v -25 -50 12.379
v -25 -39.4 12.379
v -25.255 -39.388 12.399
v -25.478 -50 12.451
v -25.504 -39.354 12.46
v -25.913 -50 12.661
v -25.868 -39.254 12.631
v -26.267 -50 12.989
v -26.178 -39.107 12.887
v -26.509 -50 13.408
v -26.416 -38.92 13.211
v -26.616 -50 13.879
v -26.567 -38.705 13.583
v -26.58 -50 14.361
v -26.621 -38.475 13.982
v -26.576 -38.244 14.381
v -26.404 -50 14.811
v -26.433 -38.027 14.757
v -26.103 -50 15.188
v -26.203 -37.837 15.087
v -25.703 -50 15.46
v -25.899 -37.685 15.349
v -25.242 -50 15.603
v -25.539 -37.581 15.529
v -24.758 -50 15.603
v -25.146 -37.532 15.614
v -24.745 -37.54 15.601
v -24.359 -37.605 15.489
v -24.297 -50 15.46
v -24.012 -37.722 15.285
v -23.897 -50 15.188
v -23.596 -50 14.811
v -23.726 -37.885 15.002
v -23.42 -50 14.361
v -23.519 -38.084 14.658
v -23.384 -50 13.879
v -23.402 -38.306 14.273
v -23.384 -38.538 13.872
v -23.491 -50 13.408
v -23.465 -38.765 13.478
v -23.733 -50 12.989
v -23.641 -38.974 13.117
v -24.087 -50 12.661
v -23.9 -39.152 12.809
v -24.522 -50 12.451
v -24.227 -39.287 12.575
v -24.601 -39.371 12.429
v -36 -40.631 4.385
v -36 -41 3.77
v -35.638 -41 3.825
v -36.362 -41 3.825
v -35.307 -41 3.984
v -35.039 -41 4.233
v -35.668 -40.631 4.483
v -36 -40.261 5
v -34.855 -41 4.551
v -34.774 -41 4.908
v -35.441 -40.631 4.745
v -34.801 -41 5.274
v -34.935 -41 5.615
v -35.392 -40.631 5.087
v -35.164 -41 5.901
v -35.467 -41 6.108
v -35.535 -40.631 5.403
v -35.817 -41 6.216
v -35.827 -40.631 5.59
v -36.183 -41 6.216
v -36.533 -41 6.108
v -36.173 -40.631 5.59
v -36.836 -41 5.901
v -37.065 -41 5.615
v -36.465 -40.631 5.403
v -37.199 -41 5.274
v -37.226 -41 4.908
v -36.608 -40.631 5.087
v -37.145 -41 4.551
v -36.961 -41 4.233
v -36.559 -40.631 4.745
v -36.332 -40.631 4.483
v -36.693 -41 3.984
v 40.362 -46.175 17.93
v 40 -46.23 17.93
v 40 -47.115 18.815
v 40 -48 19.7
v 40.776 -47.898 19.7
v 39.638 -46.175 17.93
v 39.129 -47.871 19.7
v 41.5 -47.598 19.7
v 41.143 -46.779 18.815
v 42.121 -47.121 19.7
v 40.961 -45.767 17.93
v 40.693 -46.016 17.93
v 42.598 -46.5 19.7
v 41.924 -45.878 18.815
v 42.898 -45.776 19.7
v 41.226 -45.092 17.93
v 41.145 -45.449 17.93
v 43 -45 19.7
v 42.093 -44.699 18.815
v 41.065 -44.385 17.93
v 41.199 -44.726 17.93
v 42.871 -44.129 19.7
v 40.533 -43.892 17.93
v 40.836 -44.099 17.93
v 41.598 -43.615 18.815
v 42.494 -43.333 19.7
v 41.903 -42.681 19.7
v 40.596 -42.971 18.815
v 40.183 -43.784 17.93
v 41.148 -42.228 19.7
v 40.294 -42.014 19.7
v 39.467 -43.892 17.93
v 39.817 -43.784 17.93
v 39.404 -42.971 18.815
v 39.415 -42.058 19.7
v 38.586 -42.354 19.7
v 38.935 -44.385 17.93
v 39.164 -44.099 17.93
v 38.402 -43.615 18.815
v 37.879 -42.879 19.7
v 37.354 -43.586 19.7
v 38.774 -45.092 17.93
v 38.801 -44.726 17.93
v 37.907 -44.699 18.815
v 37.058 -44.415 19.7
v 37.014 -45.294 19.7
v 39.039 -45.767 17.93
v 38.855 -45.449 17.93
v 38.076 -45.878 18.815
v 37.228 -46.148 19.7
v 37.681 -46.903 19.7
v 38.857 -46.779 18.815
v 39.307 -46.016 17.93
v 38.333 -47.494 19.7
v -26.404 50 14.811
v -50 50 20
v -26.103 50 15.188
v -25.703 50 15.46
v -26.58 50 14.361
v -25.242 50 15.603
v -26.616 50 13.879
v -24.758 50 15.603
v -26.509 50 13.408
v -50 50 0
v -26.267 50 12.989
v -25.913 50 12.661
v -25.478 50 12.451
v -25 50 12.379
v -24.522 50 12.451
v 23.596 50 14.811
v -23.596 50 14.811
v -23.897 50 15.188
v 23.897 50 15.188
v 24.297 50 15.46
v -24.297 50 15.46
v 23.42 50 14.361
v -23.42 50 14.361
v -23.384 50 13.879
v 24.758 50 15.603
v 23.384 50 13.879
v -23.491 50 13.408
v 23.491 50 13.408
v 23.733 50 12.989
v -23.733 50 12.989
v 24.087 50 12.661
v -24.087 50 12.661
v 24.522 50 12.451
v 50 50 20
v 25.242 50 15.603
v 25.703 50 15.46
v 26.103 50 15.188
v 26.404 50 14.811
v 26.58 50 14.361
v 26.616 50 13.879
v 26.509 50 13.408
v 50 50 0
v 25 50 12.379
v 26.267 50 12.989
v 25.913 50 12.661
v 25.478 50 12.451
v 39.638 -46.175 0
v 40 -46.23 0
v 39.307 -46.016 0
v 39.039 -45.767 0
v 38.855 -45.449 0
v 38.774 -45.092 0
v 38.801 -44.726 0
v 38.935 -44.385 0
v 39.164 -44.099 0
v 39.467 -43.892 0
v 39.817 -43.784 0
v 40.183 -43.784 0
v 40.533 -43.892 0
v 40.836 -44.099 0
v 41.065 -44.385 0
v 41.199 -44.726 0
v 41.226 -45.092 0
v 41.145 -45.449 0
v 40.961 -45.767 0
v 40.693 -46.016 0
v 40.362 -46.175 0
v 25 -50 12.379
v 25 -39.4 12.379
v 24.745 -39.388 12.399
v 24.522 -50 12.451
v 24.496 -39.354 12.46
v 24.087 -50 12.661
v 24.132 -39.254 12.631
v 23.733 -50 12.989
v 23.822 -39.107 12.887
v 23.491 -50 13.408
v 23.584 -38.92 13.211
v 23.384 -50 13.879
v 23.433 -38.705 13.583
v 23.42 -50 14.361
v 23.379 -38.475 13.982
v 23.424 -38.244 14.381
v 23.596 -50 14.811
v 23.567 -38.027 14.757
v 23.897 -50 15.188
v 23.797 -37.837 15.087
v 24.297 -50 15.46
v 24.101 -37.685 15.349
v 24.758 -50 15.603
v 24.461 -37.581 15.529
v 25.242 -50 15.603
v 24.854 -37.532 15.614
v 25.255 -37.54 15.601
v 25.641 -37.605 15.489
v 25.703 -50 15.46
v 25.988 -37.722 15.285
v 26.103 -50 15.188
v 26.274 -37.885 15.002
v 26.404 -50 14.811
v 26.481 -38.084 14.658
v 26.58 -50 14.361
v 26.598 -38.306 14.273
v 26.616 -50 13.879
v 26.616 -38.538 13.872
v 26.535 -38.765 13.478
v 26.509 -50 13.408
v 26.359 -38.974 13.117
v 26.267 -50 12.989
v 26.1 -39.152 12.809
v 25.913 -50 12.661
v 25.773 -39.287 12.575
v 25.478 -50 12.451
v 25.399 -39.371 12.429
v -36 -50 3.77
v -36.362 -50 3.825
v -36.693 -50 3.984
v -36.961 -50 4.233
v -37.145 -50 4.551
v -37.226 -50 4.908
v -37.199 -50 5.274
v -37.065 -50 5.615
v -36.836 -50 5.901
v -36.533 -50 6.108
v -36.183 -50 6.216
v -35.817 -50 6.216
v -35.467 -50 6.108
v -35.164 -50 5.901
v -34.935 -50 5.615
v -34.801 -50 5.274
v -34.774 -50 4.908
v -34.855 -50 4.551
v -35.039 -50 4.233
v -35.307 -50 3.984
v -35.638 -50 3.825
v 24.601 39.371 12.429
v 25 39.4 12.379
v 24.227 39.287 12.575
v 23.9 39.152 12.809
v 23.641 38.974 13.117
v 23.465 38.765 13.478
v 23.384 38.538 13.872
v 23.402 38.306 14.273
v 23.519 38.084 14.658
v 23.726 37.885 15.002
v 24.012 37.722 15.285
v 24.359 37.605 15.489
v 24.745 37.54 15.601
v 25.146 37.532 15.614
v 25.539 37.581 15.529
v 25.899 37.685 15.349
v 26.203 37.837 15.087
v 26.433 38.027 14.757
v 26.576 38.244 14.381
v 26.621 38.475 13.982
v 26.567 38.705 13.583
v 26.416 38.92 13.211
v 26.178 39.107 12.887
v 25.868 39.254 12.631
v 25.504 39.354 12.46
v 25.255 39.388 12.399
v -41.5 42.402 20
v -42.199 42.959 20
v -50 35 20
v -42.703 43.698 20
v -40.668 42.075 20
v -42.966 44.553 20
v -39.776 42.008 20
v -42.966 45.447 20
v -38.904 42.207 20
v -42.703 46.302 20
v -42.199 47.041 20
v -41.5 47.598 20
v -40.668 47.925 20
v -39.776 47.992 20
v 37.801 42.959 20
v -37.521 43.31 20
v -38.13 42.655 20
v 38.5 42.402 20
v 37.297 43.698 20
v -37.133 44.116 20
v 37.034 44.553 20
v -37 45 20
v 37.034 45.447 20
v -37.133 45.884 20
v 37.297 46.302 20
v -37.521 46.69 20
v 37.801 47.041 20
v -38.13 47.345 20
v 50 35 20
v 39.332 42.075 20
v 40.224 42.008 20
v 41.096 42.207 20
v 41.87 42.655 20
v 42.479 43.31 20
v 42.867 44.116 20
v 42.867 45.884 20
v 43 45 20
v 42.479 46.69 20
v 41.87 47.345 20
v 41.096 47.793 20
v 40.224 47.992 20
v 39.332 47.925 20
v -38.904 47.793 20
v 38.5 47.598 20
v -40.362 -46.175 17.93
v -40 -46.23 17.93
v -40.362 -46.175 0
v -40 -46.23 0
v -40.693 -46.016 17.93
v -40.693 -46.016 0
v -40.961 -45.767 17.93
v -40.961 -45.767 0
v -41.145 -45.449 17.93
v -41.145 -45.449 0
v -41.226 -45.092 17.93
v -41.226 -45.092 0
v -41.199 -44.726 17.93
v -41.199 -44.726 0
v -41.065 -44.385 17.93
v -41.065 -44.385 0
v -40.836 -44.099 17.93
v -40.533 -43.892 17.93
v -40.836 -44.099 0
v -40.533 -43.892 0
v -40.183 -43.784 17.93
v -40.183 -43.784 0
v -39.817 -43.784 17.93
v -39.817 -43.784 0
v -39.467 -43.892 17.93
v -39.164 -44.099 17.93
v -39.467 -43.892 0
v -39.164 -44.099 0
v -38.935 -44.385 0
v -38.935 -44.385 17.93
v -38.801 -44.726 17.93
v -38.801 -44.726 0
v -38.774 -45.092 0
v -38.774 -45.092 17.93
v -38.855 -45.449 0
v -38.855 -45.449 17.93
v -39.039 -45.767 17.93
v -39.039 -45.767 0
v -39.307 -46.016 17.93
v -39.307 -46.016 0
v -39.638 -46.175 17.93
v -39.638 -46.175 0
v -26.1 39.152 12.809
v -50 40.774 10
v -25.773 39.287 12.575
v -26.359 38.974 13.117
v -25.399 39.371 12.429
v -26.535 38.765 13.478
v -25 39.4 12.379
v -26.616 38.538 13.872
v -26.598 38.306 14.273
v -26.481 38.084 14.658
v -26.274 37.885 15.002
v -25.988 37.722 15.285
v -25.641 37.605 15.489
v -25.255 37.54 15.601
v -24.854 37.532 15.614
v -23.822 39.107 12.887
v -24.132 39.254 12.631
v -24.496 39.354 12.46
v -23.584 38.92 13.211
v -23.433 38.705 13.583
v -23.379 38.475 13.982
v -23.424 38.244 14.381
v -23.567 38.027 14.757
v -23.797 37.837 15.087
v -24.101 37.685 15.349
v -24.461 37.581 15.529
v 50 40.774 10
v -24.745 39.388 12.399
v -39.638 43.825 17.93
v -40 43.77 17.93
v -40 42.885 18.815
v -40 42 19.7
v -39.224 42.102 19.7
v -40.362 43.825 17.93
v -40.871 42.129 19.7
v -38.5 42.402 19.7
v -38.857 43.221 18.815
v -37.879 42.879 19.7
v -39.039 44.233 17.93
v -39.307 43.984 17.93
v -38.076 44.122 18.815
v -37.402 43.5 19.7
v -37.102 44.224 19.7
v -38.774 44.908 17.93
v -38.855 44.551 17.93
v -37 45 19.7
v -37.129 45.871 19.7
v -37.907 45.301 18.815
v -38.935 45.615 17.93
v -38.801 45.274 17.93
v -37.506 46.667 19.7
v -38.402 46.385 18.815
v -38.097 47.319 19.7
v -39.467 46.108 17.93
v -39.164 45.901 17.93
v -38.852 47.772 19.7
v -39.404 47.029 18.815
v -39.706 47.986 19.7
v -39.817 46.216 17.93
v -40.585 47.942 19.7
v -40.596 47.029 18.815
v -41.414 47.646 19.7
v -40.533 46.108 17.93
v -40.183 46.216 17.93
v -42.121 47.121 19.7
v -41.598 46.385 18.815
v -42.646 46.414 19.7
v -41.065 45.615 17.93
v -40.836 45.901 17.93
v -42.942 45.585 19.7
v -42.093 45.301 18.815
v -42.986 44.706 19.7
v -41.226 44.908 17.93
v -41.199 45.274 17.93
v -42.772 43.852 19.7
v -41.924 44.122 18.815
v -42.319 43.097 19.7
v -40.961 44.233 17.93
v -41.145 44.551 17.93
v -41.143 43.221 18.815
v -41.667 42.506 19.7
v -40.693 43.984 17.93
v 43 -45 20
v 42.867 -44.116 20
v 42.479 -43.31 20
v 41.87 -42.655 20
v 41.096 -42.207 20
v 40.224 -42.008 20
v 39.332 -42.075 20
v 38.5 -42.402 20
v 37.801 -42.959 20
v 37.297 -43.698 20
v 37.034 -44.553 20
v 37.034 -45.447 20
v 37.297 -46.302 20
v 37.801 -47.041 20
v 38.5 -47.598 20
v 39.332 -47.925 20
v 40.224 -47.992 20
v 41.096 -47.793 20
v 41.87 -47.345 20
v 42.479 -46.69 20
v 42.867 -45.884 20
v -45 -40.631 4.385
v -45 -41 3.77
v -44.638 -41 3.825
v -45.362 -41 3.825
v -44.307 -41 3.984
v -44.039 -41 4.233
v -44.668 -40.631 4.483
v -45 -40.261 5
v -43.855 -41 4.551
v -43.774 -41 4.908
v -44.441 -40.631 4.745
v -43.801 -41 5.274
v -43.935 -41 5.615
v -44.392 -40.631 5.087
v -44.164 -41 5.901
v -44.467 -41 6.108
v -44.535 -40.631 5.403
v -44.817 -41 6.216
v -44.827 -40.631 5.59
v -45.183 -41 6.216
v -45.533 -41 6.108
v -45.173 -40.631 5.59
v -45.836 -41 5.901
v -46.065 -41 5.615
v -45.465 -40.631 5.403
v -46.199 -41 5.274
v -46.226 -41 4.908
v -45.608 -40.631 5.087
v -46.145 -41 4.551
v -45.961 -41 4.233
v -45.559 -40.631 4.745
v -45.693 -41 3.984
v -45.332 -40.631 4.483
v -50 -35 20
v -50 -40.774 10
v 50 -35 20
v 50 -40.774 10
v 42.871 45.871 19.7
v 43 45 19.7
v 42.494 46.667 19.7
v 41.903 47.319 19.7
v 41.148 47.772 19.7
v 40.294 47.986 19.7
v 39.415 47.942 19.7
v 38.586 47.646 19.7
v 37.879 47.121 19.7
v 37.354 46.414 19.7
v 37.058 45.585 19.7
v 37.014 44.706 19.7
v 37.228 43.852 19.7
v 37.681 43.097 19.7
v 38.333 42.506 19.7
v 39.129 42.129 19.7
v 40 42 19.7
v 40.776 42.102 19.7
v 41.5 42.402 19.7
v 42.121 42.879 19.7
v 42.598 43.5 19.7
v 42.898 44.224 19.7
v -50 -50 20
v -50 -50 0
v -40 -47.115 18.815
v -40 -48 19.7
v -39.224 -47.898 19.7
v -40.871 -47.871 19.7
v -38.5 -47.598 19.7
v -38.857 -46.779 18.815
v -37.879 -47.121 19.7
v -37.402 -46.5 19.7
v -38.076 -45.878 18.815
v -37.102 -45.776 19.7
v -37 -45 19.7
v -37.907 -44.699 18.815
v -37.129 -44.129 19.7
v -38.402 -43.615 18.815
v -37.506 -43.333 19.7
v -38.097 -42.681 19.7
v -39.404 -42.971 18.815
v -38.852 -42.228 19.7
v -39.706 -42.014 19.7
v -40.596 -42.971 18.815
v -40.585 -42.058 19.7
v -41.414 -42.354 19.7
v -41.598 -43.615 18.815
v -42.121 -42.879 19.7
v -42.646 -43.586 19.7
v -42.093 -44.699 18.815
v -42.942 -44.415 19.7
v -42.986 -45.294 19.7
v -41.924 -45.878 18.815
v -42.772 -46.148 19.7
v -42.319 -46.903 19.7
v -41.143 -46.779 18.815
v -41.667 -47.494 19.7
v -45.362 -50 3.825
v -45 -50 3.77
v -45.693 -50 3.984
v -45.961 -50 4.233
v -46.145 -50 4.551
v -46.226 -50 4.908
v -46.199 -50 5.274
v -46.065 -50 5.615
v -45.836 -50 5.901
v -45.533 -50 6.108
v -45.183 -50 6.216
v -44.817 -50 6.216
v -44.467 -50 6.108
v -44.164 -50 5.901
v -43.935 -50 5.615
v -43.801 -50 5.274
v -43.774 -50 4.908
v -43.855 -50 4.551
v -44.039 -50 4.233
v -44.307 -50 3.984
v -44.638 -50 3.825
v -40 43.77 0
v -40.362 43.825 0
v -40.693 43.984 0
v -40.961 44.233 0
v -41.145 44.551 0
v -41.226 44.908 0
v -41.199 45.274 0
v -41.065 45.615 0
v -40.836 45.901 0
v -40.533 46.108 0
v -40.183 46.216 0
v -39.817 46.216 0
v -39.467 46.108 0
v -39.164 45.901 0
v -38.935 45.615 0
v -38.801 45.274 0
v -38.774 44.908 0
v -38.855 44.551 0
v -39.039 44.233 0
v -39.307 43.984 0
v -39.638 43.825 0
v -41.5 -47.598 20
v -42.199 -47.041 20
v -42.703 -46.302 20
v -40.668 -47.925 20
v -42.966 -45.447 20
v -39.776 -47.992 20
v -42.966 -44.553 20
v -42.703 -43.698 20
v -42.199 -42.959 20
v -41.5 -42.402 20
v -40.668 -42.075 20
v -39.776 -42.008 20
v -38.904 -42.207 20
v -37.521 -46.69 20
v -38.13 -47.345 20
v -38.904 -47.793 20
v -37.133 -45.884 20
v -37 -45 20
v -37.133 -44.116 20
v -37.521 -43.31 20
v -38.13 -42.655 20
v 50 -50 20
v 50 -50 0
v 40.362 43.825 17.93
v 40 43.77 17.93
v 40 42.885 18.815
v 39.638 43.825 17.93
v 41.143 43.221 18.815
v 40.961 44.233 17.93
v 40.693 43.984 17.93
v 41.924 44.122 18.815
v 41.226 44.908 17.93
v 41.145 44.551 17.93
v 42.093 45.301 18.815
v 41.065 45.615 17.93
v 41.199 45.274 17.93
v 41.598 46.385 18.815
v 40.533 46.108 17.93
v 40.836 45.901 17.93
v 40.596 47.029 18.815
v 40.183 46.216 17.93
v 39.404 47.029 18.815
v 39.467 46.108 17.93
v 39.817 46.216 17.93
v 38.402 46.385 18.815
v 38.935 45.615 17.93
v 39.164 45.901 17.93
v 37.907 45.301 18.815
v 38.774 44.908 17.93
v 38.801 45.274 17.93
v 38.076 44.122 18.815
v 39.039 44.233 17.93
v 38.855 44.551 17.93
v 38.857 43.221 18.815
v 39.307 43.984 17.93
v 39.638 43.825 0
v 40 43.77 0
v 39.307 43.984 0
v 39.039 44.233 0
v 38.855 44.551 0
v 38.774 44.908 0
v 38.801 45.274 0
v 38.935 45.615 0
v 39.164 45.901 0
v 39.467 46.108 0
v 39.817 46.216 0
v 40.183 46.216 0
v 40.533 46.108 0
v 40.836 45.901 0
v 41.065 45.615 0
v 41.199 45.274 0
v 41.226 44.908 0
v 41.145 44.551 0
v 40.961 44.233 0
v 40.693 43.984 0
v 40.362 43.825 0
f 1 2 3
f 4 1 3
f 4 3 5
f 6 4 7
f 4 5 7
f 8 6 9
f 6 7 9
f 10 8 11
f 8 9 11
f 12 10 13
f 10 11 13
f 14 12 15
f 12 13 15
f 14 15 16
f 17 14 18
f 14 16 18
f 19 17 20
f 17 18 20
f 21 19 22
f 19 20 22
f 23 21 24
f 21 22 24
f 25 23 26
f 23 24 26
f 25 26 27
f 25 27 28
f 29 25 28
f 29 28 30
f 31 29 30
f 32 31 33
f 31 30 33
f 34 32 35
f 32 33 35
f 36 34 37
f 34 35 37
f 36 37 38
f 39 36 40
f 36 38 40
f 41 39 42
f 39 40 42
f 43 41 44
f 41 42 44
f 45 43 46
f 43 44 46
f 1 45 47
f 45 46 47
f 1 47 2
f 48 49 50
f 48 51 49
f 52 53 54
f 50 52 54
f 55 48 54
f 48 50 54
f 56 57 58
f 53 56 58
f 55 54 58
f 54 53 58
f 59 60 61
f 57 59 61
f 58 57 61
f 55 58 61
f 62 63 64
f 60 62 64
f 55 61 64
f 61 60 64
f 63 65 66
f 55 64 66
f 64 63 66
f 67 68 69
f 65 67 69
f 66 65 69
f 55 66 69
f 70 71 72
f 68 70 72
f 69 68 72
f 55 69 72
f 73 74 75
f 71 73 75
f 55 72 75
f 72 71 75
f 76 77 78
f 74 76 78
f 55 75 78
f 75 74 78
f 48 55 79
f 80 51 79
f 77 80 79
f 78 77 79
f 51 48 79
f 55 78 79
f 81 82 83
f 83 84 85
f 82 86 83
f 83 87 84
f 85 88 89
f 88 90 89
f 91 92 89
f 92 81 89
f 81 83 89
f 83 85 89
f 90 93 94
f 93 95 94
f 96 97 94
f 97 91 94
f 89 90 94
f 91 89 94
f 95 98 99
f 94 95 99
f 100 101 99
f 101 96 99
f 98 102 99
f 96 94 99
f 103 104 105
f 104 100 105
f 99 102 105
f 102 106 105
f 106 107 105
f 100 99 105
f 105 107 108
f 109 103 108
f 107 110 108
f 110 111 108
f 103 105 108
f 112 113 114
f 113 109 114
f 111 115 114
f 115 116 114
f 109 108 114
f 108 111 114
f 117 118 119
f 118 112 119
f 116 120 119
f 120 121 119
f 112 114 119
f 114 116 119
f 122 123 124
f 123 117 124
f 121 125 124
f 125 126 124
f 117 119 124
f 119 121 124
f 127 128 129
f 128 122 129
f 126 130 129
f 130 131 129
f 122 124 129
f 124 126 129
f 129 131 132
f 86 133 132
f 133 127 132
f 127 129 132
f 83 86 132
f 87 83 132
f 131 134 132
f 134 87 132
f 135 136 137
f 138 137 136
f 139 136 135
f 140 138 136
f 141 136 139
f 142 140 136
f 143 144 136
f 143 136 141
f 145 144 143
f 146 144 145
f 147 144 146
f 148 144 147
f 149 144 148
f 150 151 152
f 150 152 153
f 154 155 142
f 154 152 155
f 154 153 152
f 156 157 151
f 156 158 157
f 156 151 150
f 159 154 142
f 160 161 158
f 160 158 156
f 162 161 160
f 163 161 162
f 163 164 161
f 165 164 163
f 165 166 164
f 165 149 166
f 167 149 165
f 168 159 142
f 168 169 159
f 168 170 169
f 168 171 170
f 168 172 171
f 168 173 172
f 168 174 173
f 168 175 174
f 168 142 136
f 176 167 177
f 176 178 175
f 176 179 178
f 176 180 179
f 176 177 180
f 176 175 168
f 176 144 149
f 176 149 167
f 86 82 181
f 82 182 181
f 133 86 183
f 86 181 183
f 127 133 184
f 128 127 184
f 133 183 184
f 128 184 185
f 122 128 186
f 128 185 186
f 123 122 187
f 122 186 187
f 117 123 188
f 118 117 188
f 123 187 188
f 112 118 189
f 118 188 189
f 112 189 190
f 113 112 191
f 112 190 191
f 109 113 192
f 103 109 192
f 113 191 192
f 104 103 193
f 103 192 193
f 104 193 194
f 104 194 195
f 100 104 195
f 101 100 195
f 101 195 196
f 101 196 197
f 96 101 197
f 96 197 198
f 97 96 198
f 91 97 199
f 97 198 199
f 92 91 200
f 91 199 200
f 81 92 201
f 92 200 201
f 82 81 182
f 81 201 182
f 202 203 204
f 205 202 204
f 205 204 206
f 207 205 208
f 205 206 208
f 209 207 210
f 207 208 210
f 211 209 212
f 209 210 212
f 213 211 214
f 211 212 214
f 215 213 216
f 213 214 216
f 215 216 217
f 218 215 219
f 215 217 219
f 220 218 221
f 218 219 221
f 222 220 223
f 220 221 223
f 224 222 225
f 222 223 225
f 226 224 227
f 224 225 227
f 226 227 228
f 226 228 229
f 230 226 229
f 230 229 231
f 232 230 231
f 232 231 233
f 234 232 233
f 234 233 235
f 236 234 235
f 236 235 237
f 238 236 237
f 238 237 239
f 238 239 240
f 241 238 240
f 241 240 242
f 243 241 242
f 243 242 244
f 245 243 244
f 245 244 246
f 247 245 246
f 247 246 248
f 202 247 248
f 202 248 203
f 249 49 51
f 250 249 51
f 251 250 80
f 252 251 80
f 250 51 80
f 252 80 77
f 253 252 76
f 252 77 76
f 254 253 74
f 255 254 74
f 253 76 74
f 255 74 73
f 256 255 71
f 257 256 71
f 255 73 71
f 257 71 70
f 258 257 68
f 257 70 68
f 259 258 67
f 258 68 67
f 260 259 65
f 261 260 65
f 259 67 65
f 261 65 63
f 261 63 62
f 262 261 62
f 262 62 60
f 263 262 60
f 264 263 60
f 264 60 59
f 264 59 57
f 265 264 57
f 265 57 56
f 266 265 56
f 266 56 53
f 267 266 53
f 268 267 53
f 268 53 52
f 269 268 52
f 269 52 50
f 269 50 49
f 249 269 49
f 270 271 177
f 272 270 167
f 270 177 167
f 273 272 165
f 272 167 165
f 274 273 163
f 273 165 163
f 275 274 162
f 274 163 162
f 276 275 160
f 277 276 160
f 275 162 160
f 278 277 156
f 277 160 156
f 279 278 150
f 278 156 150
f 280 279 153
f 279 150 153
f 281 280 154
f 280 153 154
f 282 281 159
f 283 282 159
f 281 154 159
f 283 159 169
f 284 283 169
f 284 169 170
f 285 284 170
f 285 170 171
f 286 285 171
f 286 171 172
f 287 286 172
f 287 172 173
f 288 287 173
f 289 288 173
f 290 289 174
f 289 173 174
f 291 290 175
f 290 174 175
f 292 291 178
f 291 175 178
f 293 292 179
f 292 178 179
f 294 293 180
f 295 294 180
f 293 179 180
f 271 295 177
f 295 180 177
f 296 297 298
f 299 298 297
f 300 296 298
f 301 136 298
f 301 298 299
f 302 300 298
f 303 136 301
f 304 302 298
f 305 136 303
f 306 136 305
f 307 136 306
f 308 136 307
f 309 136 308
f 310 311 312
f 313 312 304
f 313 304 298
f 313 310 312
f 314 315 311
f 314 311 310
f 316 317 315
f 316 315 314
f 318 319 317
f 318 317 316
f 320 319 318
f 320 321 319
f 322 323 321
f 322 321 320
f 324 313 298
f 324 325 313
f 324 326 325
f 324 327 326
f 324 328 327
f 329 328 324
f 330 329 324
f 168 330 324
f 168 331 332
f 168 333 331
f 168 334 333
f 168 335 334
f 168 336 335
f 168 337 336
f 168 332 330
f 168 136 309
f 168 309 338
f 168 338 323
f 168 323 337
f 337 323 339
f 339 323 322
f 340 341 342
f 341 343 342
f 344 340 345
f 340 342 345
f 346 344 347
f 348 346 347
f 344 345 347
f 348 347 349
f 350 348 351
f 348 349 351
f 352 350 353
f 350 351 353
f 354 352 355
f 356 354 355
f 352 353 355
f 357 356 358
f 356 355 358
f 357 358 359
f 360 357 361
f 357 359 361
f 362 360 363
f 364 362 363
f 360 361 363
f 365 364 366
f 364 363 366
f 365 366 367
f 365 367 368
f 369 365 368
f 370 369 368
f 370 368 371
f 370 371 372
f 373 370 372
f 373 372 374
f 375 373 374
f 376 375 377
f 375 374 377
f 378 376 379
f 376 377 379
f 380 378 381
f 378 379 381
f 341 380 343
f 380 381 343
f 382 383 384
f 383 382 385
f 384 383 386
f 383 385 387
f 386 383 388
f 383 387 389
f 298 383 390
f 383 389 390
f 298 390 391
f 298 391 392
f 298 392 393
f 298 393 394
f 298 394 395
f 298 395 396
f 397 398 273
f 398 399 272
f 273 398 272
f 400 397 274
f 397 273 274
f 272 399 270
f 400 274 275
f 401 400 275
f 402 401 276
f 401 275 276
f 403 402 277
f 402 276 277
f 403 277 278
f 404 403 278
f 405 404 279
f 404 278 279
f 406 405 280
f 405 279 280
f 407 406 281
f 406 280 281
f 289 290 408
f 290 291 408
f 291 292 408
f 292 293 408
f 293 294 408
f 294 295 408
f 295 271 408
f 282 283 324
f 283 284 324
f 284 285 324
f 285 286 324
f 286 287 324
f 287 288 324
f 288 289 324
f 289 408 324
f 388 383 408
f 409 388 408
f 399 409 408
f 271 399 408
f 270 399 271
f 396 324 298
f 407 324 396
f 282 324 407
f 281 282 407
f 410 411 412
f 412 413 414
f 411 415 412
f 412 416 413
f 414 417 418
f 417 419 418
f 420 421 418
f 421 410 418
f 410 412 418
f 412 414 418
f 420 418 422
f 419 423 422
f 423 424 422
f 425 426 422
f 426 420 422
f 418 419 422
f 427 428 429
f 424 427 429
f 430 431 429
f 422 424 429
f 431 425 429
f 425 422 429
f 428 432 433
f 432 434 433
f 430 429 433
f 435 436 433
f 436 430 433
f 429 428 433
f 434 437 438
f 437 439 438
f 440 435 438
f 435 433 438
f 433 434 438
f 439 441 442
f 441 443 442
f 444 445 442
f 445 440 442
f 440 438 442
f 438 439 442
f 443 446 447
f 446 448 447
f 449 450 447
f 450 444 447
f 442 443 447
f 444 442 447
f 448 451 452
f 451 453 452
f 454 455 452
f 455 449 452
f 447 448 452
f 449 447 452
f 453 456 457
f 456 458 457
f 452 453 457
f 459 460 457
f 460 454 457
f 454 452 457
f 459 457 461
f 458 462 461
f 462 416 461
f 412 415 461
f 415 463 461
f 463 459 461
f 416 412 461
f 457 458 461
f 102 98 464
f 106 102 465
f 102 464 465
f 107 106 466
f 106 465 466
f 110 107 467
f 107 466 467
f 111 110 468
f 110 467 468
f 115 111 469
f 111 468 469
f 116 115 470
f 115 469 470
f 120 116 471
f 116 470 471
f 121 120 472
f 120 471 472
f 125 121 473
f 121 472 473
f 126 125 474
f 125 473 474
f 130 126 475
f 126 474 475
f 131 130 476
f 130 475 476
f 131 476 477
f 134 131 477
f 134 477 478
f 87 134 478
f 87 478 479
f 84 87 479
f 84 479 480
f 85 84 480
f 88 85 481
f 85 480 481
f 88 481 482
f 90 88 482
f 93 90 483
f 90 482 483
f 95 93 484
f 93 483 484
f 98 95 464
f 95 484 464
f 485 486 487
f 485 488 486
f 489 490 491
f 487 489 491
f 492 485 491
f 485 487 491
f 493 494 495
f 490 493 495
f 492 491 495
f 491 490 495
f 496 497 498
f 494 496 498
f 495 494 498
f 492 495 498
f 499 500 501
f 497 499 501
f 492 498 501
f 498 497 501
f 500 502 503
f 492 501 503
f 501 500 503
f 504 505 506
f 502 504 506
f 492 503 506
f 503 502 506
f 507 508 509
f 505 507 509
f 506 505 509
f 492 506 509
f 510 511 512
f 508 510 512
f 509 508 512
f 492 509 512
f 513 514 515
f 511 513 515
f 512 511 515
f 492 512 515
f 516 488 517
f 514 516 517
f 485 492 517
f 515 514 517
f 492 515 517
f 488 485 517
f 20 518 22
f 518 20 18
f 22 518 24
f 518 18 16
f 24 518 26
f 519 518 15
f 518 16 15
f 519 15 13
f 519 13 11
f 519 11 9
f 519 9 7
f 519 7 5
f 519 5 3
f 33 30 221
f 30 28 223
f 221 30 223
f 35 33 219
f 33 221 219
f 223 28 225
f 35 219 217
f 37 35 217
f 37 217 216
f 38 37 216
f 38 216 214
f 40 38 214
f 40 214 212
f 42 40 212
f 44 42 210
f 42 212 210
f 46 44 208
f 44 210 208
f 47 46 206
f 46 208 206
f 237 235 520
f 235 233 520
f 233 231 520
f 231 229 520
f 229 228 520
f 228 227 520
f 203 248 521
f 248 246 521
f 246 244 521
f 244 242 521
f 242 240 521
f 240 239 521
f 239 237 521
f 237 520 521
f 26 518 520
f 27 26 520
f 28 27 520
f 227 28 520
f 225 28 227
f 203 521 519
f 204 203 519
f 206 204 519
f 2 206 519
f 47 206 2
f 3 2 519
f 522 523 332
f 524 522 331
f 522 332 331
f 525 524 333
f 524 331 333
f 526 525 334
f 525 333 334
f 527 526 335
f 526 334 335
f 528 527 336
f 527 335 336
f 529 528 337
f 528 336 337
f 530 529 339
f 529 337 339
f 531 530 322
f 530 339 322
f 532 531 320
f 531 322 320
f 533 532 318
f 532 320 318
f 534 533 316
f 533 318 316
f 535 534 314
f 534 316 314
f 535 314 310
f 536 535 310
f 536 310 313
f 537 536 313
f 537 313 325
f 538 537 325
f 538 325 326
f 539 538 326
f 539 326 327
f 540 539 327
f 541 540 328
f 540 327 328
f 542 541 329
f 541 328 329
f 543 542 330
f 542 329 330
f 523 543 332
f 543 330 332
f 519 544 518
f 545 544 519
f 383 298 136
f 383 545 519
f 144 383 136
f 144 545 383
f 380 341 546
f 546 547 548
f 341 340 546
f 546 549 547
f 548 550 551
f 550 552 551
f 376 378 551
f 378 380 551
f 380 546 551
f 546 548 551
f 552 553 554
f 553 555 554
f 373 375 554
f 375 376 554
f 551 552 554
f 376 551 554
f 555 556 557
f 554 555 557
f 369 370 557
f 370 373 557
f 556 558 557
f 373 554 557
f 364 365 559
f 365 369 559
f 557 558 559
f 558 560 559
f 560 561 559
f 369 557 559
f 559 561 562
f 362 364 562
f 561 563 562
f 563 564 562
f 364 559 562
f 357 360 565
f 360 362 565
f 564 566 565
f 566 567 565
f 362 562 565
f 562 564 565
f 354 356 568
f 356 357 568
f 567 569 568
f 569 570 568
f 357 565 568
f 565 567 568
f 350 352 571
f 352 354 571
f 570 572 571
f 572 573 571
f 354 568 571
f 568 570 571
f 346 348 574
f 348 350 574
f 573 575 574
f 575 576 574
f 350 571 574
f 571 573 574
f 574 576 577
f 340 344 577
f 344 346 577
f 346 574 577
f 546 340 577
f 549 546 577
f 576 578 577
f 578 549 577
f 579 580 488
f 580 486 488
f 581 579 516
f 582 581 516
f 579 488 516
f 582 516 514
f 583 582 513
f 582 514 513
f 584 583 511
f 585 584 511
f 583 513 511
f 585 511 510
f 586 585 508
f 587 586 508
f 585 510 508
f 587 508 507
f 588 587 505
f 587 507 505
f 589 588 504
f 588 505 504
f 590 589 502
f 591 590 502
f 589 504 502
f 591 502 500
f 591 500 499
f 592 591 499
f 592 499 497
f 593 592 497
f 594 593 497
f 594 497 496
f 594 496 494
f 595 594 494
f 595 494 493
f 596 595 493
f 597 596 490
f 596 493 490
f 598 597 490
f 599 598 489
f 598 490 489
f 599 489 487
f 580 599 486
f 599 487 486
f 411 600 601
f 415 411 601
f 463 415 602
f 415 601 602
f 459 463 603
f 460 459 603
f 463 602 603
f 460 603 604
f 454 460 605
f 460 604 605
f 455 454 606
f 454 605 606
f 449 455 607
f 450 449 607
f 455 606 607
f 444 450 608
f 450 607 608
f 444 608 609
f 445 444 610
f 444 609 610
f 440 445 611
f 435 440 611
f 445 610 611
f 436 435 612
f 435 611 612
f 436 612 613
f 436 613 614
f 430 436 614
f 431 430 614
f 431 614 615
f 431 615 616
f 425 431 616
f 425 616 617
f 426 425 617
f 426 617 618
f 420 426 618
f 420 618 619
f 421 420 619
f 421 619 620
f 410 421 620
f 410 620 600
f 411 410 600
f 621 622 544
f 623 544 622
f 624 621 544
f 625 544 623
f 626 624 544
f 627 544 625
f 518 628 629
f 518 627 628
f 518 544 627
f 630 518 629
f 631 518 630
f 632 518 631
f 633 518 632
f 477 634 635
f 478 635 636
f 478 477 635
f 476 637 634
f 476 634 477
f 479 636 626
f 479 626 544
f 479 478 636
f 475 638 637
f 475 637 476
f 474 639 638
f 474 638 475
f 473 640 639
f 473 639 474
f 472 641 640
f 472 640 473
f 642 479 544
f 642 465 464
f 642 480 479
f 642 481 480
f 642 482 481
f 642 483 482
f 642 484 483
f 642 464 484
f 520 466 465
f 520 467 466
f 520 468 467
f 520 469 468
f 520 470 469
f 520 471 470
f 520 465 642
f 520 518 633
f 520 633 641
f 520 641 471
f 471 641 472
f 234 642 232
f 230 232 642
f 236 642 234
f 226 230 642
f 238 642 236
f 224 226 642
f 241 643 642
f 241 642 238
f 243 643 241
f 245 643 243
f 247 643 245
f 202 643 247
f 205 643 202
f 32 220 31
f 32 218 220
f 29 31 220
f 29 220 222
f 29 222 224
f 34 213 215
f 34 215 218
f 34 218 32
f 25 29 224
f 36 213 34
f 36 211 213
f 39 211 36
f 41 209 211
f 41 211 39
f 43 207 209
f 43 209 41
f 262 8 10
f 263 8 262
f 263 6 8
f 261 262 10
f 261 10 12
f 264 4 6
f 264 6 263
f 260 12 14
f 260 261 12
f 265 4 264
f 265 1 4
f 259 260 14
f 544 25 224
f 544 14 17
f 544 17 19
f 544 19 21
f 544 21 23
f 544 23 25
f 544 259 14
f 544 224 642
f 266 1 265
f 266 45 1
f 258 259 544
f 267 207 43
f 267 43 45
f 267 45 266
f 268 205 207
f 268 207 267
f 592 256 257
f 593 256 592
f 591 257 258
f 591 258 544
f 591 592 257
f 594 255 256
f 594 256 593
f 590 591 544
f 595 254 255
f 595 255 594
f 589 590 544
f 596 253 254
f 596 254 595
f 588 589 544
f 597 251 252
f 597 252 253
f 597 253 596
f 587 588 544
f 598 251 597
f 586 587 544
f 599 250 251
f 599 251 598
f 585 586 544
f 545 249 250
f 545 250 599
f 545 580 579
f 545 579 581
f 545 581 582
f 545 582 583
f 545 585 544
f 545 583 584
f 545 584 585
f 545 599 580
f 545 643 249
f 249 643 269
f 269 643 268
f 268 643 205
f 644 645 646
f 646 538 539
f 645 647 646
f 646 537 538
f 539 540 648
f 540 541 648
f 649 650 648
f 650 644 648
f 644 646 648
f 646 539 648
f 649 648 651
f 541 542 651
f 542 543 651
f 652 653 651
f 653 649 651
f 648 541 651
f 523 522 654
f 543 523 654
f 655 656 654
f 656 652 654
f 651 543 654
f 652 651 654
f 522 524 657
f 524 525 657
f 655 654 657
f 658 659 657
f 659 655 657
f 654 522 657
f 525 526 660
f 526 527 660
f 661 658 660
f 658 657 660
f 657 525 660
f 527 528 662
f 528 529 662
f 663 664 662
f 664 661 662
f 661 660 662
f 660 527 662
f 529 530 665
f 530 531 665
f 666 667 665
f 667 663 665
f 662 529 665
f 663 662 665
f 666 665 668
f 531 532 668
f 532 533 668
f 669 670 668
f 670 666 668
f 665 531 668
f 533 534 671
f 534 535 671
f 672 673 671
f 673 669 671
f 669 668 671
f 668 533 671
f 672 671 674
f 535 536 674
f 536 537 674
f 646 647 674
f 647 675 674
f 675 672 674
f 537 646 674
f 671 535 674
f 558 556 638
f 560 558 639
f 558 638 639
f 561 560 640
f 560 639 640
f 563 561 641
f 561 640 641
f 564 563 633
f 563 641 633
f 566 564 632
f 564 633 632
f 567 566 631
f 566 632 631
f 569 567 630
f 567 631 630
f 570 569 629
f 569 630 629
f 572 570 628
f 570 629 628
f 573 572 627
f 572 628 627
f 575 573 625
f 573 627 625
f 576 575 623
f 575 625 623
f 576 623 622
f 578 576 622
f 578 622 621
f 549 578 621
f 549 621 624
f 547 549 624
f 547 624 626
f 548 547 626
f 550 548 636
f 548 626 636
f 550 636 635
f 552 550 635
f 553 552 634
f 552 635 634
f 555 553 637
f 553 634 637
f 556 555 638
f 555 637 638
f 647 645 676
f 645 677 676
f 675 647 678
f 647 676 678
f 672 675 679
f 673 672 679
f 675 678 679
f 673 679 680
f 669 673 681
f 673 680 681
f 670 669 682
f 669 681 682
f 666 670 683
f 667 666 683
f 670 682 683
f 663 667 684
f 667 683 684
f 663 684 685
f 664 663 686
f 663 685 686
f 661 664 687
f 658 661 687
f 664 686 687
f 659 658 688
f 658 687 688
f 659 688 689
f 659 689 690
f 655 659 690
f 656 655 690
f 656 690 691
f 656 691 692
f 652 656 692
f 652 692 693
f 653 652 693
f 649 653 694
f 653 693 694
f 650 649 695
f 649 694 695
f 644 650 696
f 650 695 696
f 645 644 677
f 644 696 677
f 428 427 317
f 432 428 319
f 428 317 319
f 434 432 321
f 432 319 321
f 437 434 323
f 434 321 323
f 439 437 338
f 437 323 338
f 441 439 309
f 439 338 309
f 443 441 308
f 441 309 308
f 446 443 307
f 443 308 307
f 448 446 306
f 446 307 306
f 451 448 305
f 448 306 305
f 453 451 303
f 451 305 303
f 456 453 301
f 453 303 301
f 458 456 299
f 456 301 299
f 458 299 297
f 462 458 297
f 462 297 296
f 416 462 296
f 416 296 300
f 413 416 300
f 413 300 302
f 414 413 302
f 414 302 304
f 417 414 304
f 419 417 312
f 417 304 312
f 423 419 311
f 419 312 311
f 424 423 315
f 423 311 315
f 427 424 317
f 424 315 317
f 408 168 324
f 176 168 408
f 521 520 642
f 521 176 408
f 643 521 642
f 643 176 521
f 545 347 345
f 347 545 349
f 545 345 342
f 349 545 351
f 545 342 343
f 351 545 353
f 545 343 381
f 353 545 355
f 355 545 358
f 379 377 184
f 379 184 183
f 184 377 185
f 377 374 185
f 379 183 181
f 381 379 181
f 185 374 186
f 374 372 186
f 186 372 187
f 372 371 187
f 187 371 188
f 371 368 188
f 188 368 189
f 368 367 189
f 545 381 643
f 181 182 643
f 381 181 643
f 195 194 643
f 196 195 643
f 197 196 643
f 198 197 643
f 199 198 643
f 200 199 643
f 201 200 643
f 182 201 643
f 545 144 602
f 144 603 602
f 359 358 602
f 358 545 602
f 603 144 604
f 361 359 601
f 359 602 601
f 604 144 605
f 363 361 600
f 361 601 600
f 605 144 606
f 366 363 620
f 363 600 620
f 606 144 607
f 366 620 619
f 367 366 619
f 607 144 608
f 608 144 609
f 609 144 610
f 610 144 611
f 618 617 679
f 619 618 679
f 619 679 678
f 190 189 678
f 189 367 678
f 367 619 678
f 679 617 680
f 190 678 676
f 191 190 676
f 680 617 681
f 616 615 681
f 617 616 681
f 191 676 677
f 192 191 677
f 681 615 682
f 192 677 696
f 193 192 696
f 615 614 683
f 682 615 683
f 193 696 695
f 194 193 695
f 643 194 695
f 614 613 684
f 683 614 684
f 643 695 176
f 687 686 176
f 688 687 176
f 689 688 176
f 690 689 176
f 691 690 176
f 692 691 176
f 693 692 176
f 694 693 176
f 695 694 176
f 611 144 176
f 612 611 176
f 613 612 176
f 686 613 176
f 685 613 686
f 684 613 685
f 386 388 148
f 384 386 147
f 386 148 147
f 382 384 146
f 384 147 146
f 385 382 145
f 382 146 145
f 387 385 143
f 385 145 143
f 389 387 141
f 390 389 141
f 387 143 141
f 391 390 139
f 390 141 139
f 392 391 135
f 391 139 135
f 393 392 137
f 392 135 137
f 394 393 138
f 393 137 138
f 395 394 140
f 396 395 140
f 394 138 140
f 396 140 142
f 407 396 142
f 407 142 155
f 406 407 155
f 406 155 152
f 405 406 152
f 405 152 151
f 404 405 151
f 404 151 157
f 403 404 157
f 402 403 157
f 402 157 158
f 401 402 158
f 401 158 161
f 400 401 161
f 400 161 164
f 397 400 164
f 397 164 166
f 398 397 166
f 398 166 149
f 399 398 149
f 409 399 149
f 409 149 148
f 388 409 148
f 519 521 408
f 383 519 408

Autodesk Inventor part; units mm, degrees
ref_plane "YZ Plane" through (0, 0, 0) normal (1, 0, 0) x (0, 1, 0)
ref_plane "XZ Plane" through (0, 0, 0) normal (0, 1, 0) x (-1, 0, 0)
ref_plane "XY Plane" through (0, 0, 0) normal (0, 0, 1) x (1, 0, 0)
sketch "Sketch1" plane through (0, 0, 0) normal (0, 0, 1) x (1, 0, 0)
  line L0 (-50, 50) -> (50, 50)
  line L1 (50, 50) -> (50, -50)
  line L2 (50, -50) -> (-50, -50)
  line L3 (-50, -50) -> (-50, 50)
  line L4 (0, 0) -> (0, 10.7298) construction
  line L5 (0, 0) -> (15.4092, 0) construction
  dimension "d0" = 100
  dimension "d1" = 100
extrude "Extrusion1" add sketch "Sketch1" along normal blind 20
sketch "Sketch2" plane through (50, -50, 0) normal (1, 0, 0) x (0, 0, -1)
  line L0 (-20, 100) -> (-20, 0)
  line L1 (-20, 15) -> (-10, 9.2265)
  line L2 (-10, 9.2265) -> (-10, 90.7735)
  line L3 (-10, 90.7735) -> (-20, 85)
  line L4 (0, 0) -> (-20, 0) projected
  line L5 (0, 100) -> (-20, 100) projected
  point P0 (0, 50)
  dimension "d4" = 60
  dimension "d5" = 60
  dimension "d6" = 10
  dimension "d9" = 15
  dimension "d10" = 15
extrude "Extrusion2" cut sketch "Sketch2" against normal blind 115.5
sketch "Sketch4" plane through (0, 0, 20) normal (0, 0, 1) x (1, 0, 0)
  line L0 (-50, -50) -> (50, -50) projected
  line L1 (-50, -35) -> (-50, -50) projected
  line L2 (50, -50) -> (50, -35) projected
  line L3 (-50, 50) -> (-50, 35) projected
  line L4 (50, 50) -> (-50, 50) projected
  line L5 (50, 35) -> (50, 50) projected
  circle A0 centre (-40, -45) radius 3
  circle A1 centre (40, -45) radius 3
  circle A2 centre (-40, 45) radius 3
  circle A3 centre (40, 45) radius 3
  point P0 (0, 0)
  dimension "d28" = 5
  dimension "d29" = 10
  dimension "d30" = 5
  dimension "d31" = 10
  dimension "d32" = 10
  dimension "d33" = 5
  dimension "d34" = 10
  dimension "d35" = 5
  dimension "d36" = 6
  dimension "d37" = 6
  dimension "d38" = 6
  dimension "d39" = 6
extrude "Extrusion3" cut sketch "Sketch4" against normal blind 0.3
sketch "Sketch5" plane through (-40, 45, 19.7) normal (0, 0, 1) x (1, 0, 0)
  circle A0 centre (0, -90) radius 3 projected
  circle A1 centre (0, 0) radius 3 projected
  circle A2 centre (80, 0) radius 3 projected
  circle A3 centre (80, -90) radius 3 projected
  point P0 (40, -45)
hole "Hole2" at (-40, -45, 19.7) at (-40, 45, 19.7) at (40, 45, 19.7) at (40, -45, 19.7) direction (0, 0, -1) diameter 2.459 end through all countersink diameter 6 countersink angle 90 thread size "M3x0.5" class "6H" standard "ISO Metric profile"
sketch "Sketch6" plane through (-50, -50, 0) normal (0, -1, 0) x (1, 0, 0)
  line L0 (0, 20) -> (100, 20) projected
  line L1 (100, 0) -> (0, 0) projected
  line L2 (100, 0) -> (100, 20) projected
  line L3 (0, 0) -> (0, 20) projected
  point P0 (50, 0)
  point P1 (75, 14)
  point P2 (50, 0)
  point P3 (25, 14)
  dimension "d49" = 6
  dimension "d57" = 25
  dimension "d65" = 25
hole "Hole3" at (25, -50, 14) at (-25, -50, 14) direction (0, 1, 0) diameter 3.242 end through all thread size "M4x0.7" class "6H" standard "ISO Metric profile"
sketch "Sketch7" plane through (-50, -50, 0) normal (0, -1, 0) x (1, 0, 0)
  circle A0 centre (14, 5) radius 1.6 projected
  circle A1 centre (5, 5) radius 1.6 projected
  point P0 (50, 0)
hole "Hole4" at (-45, -50, 5) at (-36, -50, 5) direction (0, 1, 0) diameter 2.459 depth 9 tip angle 118 thread size "M3x0.5" class "6H" standard "ISO Metric profile"
properties part number "3d_LM-Welding_Tooling - Upper fixed base" material "Aluminium 6061-T6"
